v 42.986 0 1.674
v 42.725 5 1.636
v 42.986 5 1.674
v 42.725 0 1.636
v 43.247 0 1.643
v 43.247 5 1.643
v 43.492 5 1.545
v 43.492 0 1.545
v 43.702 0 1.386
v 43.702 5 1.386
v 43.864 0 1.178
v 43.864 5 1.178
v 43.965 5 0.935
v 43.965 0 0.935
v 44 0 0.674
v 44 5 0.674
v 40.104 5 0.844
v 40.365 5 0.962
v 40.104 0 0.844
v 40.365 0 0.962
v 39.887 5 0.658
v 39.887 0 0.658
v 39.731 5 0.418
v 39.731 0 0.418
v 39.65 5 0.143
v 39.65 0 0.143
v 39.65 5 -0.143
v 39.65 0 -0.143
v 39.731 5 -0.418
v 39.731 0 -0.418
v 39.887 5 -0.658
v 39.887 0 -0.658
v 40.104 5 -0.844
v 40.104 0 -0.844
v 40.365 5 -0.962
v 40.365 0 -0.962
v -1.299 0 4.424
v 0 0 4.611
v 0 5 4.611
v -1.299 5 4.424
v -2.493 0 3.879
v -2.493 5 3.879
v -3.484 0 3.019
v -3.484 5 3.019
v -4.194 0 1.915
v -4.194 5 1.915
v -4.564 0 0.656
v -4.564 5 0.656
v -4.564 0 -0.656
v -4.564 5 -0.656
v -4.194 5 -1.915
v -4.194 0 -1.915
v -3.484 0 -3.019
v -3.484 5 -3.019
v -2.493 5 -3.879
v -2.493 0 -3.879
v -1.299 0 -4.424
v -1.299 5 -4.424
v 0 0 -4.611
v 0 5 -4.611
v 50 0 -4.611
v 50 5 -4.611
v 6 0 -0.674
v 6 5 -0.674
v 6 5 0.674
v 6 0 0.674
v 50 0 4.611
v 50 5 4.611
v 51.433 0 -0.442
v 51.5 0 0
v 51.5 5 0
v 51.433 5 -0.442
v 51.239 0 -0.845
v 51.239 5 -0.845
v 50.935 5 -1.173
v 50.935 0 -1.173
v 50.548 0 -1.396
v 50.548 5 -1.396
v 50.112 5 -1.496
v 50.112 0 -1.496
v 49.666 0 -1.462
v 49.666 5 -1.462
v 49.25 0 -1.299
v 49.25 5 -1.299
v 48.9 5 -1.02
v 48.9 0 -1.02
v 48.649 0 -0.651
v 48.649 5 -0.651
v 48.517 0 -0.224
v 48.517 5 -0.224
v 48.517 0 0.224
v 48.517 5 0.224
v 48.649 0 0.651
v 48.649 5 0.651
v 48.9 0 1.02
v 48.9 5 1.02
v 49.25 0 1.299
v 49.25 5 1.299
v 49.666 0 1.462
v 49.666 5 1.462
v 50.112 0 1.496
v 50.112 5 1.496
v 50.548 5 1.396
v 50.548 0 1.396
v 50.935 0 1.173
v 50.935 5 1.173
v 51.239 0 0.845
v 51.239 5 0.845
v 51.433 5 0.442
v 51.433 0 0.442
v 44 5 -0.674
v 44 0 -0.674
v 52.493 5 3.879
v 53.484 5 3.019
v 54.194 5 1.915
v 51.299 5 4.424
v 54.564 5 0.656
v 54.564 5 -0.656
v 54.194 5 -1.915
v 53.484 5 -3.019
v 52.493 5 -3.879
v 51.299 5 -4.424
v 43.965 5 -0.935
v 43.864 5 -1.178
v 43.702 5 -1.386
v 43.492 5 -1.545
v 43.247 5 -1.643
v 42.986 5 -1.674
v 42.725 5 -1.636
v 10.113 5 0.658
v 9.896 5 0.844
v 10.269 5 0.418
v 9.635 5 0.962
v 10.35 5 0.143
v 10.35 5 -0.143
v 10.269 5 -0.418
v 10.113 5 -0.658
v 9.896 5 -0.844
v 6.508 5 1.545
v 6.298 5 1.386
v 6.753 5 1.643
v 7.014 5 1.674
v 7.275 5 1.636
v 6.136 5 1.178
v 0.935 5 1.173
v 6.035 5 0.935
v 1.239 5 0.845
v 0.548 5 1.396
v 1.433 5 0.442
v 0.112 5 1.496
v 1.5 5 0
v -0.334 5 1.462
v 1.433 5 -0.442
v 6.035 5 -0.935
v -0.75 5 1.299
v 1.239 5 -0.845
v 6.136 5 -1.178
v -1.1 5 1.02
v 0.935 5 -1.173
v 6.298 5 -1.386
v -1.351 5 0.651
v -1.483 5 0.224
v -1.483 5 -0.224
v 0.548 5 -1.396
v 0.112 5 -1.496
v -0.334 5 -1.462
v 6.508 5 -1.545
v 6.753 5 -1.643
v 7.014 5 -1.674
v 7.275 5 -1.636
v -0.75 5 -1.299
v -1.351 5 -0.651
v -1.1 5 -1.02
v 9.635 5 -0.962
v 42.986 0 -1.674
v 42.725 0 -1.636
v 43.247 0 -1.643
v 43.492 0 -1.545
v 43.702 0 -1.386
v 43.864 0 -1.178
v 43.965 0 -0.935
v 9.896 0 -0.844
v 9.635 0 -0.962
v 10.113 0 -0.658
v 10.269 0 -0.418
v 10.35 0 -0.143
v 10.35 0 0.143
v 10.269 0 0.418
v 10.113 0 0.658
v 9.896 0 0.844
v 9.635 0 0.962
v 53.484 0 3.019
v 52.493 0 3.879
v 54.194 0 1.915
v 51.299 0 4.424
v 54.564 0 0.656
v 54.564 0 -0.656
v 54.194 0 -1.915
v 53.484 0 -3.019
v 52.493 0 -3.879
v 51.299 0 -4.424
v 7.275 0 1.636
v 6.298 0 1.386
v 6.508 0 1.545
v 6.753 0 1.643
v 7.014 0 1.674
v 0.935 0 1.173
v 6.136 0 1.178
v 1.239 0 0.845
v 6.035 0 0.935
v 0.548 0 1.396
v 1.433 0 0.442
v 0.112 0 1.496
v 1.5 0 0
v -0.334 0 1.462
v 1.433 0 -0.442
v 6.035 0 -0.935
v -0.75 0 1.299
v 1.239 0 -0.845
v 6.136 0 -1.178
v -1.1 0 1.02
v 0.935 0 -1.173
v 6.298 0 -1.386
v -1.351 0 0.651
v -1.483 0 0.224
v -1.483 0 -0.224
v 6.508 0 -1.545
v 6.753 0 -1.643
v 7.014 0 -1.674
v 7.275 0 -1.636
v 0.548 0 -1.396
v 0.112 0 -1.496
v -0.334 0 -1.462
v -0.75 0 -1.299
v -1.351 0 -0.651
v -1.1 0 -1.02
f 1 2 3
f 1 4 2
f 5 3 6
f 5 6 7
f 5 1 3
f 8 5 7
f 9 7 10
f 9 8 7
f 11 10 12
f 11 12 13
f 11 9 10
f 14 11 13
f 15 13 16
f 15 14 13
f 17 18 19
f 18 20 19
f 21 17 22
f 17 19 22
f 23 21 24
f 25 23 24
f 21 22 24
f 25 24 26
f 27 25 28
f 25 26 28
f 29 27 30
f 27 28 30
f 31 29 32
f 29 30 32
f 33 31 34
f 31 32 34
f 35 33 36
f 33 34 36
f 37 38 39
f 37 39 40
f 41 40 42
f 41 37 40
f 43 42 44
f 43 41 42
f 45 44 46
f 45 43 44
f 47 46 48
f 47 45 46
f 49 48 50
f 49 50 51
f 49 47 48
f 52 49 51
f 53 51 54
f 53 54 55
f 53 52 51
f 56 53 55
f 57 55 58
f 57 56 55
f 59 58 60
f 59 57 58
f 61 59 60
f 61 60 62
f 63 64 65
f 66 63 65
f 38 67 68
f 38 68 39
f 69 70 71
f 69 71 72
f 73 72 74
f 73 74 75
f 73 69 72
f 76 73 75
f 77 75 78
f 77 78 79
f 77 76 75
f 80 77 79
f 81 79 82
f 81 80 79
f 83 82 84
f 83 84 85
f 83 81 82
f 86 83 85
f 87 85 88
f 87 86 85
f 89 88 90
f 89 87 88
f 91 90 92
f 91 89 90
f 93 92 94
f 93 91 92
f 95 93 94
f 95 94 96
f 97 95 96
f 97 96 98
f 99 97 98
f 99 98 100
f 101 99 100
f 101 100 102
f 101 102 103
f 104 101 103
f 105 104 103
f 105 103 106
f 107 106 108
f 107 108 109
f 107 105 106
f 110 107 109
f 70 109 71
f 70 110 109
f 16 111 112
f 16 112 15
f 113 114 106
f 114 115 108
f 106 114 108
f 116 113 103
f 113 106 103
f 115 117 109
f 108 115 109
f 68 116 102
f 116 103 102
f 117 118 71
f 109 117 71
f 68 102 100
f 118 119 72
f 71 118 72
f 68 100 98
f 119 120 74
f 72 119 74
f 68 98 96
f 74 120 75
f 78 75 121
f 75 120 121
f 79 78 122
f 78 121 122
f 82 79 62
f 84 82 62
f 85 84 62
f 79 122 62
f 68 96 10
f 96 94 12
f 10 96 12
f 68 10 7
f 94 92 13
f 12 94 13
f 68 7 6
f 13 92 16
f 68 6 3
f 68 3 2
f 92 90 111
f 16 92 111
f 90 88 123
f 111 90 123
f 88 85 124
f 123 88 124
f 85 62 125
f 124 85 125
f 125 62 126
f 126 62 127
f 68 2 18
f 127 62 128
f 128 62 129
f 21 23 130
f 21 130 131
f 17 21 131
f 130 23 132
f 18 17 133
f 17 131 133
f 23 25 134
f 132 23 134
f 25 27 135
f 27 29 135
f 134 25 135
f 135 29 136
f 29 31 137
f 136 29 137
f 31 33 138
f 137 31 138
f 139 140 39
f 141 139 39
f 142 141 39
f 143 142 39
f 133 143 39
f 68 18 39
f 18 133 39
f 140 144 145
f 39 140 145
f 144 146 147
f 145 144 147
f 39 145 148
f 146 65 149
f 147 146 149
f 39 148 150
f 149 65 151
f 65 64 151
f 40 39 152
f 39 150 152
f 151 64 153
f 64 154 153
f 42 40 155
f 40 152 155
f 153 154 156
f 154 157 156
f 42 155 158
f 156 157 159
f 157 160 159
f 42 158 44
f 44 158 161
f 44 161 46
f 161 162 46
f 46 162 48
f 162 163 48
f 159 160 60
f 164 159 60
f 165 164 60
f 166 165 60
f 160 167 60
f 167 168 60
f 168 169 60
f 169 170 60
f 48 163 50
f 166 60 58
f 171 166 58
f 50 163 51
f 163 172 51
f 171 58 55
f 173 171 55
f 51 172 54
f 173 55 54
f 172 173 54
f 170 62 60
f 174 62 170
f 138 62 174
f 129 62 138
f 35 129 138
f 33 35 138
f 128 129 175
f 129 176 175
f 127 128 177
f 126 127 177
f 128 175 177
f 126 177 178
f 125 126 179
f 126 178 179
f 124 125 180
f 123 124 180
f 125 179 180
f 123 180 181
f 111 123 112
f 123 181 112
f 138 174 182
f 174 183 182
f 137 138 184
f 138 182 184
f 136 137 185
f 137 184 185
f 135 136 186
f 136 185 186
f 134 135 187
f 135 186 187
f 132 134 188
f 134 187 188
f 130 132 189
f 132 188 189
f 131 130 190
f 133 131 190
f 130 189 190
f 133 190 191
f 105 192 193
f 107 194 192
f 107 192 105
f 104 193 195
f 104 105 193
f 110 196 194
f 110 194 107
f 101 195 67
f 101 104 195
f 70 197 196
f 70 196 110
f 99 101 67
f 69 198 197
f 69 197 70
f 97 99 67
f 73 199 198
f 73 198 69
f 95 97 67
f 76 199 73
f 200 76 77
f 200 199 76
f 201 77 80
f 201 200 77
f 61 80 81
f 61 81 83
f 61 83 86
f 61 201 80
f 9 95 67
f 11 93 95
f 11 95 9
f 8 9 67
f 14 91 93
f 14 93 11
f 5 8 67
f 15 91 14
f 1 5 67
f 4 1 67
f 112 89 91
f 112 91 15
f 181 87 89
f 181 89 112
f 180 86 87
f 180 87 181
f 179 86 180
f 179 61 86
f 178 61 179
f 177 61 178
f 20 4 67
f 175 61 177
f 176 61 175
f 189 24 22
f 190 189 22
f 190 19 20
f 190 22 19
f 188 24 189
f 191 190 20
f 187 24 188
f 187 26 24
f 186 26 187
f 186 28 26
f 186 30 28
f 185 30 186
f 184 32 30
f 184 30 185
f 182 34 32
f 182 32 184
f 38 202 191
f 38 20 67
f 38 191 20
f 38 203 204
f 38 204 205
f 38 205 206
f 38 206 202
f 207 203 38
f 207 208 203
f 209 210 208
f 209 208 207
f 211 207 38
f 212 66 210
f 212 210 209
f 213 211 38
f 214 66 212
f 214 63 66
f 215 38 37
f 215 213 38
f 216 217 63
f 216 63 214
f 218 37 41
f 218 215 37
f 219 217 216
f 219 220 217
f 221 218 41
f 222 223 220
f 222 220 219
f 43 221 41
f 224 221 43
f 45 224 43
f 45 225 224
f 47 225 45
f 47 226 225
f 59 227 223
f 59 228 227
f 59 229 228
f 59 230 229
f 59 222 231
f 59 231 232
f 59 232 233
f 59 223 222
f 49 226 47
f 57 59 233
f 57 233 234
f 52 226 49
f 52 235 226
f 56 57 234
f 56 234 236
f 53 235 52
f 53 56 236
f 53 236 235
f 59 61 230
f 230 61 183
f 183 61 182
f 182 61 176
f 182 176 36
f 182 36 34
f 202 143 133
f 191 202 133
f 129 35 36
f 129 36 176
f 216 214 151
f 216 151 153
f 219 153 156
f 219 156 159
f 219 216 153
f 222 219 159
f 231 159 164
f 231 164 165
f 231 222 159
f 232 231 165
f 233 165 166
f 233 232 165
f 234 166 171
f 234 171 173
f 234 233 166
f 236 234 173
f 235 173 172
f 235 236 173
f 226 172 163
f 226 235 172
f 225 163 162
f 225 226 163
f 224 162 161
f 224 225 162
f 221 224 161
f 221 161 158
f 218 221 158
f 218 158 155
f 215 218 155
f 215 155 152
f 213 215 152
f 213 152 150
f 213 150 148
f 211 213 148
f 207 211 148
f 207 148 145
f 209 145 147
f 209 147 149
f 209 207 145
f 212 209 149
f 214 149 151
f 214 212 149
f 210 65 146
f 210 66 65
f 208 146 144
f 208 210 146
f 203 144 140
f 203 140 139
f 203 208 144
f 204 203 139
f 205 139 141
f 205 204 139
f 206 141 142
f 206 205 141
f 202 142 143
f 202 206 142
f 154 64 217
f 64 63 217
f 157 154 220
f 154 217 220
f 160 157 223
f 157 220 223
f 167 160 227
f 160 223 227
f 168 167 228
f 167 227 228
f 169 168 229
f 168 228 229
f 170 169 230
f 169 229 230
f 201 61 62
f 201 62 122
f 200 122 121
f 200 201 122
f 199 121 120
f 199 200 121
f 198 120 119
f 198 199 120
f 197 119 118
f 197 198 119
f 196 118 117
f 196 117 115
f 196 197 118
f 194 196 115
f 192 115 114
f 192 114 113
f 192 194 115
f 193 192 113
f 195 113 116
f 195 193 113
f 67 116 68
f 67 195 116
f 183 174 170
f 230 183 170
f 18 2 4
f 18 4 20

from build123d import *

# Parameters (mm, degrees)
SKETCH1_R           = 1.5
BOSS_EXTRUDE1_DEPTH = 5
CUT_EXTRUDE2_DEPTH  = 17
FILLET1_R           = 1


with BuildPart() as part:
    # Sketch1 → Boss-Extrude1 (new body)
    with BuildSketch(Plane(origin=(0, 0, 0), x_dir=(1, 0, 0), z_dir=(0, 1, 0))):
        with BuildLine():
            Line((0, 4.610590887), (50, 4.610590887))
            ThreePointArc((50, 4.610590887), (54.610590887, 0), (50, -4.610590887))
            Line((50, -4.610590887), (0, -4.610590887))
            ThreePointArc((0, -4.610590887), (-4.610590887, 0), (0, 4.610590887))
        make_face()
        Circle(SKETCH1_R, mode=Mode.SUBTRACT)
        with Locations((50, 0)):
            Circle(SKETCH1_R, mode=Mode.SUBTRACT)
    extrude(amount=BOSS_EXTRUDE1_DEPTH)

    # Sketch3 → Cut-Extrude2 (cut)
    with BuildSketch(Plane(origin=(0, 5, 0), x_dir=(1, 0, 0), z_dir=(0, 1, 0))):
        Polygon((6, 2), (6, -2), (13, 0), align=None)
        Polygon((44, 2), (44, -2), (37, 0), align=None)
    extrude(amount=-CUT_EXTRUDE2_DEPTH, mode=Mode.SUBTRACT)

    # Fillet1
    fillet1_edges = [part.edges().sort_by_distance(p)[0] for p in [
        (6, 2.5, -2),
        (13, 2.5, 0),
        (6, 2.5, 2),
        (37, 2.5, 0),
        (44, 2.5, -2),
        (44, 2.5, 2),
    ]]
    fillet(fillet1_edges, radius=FILLET1_R)


solid = part.part
